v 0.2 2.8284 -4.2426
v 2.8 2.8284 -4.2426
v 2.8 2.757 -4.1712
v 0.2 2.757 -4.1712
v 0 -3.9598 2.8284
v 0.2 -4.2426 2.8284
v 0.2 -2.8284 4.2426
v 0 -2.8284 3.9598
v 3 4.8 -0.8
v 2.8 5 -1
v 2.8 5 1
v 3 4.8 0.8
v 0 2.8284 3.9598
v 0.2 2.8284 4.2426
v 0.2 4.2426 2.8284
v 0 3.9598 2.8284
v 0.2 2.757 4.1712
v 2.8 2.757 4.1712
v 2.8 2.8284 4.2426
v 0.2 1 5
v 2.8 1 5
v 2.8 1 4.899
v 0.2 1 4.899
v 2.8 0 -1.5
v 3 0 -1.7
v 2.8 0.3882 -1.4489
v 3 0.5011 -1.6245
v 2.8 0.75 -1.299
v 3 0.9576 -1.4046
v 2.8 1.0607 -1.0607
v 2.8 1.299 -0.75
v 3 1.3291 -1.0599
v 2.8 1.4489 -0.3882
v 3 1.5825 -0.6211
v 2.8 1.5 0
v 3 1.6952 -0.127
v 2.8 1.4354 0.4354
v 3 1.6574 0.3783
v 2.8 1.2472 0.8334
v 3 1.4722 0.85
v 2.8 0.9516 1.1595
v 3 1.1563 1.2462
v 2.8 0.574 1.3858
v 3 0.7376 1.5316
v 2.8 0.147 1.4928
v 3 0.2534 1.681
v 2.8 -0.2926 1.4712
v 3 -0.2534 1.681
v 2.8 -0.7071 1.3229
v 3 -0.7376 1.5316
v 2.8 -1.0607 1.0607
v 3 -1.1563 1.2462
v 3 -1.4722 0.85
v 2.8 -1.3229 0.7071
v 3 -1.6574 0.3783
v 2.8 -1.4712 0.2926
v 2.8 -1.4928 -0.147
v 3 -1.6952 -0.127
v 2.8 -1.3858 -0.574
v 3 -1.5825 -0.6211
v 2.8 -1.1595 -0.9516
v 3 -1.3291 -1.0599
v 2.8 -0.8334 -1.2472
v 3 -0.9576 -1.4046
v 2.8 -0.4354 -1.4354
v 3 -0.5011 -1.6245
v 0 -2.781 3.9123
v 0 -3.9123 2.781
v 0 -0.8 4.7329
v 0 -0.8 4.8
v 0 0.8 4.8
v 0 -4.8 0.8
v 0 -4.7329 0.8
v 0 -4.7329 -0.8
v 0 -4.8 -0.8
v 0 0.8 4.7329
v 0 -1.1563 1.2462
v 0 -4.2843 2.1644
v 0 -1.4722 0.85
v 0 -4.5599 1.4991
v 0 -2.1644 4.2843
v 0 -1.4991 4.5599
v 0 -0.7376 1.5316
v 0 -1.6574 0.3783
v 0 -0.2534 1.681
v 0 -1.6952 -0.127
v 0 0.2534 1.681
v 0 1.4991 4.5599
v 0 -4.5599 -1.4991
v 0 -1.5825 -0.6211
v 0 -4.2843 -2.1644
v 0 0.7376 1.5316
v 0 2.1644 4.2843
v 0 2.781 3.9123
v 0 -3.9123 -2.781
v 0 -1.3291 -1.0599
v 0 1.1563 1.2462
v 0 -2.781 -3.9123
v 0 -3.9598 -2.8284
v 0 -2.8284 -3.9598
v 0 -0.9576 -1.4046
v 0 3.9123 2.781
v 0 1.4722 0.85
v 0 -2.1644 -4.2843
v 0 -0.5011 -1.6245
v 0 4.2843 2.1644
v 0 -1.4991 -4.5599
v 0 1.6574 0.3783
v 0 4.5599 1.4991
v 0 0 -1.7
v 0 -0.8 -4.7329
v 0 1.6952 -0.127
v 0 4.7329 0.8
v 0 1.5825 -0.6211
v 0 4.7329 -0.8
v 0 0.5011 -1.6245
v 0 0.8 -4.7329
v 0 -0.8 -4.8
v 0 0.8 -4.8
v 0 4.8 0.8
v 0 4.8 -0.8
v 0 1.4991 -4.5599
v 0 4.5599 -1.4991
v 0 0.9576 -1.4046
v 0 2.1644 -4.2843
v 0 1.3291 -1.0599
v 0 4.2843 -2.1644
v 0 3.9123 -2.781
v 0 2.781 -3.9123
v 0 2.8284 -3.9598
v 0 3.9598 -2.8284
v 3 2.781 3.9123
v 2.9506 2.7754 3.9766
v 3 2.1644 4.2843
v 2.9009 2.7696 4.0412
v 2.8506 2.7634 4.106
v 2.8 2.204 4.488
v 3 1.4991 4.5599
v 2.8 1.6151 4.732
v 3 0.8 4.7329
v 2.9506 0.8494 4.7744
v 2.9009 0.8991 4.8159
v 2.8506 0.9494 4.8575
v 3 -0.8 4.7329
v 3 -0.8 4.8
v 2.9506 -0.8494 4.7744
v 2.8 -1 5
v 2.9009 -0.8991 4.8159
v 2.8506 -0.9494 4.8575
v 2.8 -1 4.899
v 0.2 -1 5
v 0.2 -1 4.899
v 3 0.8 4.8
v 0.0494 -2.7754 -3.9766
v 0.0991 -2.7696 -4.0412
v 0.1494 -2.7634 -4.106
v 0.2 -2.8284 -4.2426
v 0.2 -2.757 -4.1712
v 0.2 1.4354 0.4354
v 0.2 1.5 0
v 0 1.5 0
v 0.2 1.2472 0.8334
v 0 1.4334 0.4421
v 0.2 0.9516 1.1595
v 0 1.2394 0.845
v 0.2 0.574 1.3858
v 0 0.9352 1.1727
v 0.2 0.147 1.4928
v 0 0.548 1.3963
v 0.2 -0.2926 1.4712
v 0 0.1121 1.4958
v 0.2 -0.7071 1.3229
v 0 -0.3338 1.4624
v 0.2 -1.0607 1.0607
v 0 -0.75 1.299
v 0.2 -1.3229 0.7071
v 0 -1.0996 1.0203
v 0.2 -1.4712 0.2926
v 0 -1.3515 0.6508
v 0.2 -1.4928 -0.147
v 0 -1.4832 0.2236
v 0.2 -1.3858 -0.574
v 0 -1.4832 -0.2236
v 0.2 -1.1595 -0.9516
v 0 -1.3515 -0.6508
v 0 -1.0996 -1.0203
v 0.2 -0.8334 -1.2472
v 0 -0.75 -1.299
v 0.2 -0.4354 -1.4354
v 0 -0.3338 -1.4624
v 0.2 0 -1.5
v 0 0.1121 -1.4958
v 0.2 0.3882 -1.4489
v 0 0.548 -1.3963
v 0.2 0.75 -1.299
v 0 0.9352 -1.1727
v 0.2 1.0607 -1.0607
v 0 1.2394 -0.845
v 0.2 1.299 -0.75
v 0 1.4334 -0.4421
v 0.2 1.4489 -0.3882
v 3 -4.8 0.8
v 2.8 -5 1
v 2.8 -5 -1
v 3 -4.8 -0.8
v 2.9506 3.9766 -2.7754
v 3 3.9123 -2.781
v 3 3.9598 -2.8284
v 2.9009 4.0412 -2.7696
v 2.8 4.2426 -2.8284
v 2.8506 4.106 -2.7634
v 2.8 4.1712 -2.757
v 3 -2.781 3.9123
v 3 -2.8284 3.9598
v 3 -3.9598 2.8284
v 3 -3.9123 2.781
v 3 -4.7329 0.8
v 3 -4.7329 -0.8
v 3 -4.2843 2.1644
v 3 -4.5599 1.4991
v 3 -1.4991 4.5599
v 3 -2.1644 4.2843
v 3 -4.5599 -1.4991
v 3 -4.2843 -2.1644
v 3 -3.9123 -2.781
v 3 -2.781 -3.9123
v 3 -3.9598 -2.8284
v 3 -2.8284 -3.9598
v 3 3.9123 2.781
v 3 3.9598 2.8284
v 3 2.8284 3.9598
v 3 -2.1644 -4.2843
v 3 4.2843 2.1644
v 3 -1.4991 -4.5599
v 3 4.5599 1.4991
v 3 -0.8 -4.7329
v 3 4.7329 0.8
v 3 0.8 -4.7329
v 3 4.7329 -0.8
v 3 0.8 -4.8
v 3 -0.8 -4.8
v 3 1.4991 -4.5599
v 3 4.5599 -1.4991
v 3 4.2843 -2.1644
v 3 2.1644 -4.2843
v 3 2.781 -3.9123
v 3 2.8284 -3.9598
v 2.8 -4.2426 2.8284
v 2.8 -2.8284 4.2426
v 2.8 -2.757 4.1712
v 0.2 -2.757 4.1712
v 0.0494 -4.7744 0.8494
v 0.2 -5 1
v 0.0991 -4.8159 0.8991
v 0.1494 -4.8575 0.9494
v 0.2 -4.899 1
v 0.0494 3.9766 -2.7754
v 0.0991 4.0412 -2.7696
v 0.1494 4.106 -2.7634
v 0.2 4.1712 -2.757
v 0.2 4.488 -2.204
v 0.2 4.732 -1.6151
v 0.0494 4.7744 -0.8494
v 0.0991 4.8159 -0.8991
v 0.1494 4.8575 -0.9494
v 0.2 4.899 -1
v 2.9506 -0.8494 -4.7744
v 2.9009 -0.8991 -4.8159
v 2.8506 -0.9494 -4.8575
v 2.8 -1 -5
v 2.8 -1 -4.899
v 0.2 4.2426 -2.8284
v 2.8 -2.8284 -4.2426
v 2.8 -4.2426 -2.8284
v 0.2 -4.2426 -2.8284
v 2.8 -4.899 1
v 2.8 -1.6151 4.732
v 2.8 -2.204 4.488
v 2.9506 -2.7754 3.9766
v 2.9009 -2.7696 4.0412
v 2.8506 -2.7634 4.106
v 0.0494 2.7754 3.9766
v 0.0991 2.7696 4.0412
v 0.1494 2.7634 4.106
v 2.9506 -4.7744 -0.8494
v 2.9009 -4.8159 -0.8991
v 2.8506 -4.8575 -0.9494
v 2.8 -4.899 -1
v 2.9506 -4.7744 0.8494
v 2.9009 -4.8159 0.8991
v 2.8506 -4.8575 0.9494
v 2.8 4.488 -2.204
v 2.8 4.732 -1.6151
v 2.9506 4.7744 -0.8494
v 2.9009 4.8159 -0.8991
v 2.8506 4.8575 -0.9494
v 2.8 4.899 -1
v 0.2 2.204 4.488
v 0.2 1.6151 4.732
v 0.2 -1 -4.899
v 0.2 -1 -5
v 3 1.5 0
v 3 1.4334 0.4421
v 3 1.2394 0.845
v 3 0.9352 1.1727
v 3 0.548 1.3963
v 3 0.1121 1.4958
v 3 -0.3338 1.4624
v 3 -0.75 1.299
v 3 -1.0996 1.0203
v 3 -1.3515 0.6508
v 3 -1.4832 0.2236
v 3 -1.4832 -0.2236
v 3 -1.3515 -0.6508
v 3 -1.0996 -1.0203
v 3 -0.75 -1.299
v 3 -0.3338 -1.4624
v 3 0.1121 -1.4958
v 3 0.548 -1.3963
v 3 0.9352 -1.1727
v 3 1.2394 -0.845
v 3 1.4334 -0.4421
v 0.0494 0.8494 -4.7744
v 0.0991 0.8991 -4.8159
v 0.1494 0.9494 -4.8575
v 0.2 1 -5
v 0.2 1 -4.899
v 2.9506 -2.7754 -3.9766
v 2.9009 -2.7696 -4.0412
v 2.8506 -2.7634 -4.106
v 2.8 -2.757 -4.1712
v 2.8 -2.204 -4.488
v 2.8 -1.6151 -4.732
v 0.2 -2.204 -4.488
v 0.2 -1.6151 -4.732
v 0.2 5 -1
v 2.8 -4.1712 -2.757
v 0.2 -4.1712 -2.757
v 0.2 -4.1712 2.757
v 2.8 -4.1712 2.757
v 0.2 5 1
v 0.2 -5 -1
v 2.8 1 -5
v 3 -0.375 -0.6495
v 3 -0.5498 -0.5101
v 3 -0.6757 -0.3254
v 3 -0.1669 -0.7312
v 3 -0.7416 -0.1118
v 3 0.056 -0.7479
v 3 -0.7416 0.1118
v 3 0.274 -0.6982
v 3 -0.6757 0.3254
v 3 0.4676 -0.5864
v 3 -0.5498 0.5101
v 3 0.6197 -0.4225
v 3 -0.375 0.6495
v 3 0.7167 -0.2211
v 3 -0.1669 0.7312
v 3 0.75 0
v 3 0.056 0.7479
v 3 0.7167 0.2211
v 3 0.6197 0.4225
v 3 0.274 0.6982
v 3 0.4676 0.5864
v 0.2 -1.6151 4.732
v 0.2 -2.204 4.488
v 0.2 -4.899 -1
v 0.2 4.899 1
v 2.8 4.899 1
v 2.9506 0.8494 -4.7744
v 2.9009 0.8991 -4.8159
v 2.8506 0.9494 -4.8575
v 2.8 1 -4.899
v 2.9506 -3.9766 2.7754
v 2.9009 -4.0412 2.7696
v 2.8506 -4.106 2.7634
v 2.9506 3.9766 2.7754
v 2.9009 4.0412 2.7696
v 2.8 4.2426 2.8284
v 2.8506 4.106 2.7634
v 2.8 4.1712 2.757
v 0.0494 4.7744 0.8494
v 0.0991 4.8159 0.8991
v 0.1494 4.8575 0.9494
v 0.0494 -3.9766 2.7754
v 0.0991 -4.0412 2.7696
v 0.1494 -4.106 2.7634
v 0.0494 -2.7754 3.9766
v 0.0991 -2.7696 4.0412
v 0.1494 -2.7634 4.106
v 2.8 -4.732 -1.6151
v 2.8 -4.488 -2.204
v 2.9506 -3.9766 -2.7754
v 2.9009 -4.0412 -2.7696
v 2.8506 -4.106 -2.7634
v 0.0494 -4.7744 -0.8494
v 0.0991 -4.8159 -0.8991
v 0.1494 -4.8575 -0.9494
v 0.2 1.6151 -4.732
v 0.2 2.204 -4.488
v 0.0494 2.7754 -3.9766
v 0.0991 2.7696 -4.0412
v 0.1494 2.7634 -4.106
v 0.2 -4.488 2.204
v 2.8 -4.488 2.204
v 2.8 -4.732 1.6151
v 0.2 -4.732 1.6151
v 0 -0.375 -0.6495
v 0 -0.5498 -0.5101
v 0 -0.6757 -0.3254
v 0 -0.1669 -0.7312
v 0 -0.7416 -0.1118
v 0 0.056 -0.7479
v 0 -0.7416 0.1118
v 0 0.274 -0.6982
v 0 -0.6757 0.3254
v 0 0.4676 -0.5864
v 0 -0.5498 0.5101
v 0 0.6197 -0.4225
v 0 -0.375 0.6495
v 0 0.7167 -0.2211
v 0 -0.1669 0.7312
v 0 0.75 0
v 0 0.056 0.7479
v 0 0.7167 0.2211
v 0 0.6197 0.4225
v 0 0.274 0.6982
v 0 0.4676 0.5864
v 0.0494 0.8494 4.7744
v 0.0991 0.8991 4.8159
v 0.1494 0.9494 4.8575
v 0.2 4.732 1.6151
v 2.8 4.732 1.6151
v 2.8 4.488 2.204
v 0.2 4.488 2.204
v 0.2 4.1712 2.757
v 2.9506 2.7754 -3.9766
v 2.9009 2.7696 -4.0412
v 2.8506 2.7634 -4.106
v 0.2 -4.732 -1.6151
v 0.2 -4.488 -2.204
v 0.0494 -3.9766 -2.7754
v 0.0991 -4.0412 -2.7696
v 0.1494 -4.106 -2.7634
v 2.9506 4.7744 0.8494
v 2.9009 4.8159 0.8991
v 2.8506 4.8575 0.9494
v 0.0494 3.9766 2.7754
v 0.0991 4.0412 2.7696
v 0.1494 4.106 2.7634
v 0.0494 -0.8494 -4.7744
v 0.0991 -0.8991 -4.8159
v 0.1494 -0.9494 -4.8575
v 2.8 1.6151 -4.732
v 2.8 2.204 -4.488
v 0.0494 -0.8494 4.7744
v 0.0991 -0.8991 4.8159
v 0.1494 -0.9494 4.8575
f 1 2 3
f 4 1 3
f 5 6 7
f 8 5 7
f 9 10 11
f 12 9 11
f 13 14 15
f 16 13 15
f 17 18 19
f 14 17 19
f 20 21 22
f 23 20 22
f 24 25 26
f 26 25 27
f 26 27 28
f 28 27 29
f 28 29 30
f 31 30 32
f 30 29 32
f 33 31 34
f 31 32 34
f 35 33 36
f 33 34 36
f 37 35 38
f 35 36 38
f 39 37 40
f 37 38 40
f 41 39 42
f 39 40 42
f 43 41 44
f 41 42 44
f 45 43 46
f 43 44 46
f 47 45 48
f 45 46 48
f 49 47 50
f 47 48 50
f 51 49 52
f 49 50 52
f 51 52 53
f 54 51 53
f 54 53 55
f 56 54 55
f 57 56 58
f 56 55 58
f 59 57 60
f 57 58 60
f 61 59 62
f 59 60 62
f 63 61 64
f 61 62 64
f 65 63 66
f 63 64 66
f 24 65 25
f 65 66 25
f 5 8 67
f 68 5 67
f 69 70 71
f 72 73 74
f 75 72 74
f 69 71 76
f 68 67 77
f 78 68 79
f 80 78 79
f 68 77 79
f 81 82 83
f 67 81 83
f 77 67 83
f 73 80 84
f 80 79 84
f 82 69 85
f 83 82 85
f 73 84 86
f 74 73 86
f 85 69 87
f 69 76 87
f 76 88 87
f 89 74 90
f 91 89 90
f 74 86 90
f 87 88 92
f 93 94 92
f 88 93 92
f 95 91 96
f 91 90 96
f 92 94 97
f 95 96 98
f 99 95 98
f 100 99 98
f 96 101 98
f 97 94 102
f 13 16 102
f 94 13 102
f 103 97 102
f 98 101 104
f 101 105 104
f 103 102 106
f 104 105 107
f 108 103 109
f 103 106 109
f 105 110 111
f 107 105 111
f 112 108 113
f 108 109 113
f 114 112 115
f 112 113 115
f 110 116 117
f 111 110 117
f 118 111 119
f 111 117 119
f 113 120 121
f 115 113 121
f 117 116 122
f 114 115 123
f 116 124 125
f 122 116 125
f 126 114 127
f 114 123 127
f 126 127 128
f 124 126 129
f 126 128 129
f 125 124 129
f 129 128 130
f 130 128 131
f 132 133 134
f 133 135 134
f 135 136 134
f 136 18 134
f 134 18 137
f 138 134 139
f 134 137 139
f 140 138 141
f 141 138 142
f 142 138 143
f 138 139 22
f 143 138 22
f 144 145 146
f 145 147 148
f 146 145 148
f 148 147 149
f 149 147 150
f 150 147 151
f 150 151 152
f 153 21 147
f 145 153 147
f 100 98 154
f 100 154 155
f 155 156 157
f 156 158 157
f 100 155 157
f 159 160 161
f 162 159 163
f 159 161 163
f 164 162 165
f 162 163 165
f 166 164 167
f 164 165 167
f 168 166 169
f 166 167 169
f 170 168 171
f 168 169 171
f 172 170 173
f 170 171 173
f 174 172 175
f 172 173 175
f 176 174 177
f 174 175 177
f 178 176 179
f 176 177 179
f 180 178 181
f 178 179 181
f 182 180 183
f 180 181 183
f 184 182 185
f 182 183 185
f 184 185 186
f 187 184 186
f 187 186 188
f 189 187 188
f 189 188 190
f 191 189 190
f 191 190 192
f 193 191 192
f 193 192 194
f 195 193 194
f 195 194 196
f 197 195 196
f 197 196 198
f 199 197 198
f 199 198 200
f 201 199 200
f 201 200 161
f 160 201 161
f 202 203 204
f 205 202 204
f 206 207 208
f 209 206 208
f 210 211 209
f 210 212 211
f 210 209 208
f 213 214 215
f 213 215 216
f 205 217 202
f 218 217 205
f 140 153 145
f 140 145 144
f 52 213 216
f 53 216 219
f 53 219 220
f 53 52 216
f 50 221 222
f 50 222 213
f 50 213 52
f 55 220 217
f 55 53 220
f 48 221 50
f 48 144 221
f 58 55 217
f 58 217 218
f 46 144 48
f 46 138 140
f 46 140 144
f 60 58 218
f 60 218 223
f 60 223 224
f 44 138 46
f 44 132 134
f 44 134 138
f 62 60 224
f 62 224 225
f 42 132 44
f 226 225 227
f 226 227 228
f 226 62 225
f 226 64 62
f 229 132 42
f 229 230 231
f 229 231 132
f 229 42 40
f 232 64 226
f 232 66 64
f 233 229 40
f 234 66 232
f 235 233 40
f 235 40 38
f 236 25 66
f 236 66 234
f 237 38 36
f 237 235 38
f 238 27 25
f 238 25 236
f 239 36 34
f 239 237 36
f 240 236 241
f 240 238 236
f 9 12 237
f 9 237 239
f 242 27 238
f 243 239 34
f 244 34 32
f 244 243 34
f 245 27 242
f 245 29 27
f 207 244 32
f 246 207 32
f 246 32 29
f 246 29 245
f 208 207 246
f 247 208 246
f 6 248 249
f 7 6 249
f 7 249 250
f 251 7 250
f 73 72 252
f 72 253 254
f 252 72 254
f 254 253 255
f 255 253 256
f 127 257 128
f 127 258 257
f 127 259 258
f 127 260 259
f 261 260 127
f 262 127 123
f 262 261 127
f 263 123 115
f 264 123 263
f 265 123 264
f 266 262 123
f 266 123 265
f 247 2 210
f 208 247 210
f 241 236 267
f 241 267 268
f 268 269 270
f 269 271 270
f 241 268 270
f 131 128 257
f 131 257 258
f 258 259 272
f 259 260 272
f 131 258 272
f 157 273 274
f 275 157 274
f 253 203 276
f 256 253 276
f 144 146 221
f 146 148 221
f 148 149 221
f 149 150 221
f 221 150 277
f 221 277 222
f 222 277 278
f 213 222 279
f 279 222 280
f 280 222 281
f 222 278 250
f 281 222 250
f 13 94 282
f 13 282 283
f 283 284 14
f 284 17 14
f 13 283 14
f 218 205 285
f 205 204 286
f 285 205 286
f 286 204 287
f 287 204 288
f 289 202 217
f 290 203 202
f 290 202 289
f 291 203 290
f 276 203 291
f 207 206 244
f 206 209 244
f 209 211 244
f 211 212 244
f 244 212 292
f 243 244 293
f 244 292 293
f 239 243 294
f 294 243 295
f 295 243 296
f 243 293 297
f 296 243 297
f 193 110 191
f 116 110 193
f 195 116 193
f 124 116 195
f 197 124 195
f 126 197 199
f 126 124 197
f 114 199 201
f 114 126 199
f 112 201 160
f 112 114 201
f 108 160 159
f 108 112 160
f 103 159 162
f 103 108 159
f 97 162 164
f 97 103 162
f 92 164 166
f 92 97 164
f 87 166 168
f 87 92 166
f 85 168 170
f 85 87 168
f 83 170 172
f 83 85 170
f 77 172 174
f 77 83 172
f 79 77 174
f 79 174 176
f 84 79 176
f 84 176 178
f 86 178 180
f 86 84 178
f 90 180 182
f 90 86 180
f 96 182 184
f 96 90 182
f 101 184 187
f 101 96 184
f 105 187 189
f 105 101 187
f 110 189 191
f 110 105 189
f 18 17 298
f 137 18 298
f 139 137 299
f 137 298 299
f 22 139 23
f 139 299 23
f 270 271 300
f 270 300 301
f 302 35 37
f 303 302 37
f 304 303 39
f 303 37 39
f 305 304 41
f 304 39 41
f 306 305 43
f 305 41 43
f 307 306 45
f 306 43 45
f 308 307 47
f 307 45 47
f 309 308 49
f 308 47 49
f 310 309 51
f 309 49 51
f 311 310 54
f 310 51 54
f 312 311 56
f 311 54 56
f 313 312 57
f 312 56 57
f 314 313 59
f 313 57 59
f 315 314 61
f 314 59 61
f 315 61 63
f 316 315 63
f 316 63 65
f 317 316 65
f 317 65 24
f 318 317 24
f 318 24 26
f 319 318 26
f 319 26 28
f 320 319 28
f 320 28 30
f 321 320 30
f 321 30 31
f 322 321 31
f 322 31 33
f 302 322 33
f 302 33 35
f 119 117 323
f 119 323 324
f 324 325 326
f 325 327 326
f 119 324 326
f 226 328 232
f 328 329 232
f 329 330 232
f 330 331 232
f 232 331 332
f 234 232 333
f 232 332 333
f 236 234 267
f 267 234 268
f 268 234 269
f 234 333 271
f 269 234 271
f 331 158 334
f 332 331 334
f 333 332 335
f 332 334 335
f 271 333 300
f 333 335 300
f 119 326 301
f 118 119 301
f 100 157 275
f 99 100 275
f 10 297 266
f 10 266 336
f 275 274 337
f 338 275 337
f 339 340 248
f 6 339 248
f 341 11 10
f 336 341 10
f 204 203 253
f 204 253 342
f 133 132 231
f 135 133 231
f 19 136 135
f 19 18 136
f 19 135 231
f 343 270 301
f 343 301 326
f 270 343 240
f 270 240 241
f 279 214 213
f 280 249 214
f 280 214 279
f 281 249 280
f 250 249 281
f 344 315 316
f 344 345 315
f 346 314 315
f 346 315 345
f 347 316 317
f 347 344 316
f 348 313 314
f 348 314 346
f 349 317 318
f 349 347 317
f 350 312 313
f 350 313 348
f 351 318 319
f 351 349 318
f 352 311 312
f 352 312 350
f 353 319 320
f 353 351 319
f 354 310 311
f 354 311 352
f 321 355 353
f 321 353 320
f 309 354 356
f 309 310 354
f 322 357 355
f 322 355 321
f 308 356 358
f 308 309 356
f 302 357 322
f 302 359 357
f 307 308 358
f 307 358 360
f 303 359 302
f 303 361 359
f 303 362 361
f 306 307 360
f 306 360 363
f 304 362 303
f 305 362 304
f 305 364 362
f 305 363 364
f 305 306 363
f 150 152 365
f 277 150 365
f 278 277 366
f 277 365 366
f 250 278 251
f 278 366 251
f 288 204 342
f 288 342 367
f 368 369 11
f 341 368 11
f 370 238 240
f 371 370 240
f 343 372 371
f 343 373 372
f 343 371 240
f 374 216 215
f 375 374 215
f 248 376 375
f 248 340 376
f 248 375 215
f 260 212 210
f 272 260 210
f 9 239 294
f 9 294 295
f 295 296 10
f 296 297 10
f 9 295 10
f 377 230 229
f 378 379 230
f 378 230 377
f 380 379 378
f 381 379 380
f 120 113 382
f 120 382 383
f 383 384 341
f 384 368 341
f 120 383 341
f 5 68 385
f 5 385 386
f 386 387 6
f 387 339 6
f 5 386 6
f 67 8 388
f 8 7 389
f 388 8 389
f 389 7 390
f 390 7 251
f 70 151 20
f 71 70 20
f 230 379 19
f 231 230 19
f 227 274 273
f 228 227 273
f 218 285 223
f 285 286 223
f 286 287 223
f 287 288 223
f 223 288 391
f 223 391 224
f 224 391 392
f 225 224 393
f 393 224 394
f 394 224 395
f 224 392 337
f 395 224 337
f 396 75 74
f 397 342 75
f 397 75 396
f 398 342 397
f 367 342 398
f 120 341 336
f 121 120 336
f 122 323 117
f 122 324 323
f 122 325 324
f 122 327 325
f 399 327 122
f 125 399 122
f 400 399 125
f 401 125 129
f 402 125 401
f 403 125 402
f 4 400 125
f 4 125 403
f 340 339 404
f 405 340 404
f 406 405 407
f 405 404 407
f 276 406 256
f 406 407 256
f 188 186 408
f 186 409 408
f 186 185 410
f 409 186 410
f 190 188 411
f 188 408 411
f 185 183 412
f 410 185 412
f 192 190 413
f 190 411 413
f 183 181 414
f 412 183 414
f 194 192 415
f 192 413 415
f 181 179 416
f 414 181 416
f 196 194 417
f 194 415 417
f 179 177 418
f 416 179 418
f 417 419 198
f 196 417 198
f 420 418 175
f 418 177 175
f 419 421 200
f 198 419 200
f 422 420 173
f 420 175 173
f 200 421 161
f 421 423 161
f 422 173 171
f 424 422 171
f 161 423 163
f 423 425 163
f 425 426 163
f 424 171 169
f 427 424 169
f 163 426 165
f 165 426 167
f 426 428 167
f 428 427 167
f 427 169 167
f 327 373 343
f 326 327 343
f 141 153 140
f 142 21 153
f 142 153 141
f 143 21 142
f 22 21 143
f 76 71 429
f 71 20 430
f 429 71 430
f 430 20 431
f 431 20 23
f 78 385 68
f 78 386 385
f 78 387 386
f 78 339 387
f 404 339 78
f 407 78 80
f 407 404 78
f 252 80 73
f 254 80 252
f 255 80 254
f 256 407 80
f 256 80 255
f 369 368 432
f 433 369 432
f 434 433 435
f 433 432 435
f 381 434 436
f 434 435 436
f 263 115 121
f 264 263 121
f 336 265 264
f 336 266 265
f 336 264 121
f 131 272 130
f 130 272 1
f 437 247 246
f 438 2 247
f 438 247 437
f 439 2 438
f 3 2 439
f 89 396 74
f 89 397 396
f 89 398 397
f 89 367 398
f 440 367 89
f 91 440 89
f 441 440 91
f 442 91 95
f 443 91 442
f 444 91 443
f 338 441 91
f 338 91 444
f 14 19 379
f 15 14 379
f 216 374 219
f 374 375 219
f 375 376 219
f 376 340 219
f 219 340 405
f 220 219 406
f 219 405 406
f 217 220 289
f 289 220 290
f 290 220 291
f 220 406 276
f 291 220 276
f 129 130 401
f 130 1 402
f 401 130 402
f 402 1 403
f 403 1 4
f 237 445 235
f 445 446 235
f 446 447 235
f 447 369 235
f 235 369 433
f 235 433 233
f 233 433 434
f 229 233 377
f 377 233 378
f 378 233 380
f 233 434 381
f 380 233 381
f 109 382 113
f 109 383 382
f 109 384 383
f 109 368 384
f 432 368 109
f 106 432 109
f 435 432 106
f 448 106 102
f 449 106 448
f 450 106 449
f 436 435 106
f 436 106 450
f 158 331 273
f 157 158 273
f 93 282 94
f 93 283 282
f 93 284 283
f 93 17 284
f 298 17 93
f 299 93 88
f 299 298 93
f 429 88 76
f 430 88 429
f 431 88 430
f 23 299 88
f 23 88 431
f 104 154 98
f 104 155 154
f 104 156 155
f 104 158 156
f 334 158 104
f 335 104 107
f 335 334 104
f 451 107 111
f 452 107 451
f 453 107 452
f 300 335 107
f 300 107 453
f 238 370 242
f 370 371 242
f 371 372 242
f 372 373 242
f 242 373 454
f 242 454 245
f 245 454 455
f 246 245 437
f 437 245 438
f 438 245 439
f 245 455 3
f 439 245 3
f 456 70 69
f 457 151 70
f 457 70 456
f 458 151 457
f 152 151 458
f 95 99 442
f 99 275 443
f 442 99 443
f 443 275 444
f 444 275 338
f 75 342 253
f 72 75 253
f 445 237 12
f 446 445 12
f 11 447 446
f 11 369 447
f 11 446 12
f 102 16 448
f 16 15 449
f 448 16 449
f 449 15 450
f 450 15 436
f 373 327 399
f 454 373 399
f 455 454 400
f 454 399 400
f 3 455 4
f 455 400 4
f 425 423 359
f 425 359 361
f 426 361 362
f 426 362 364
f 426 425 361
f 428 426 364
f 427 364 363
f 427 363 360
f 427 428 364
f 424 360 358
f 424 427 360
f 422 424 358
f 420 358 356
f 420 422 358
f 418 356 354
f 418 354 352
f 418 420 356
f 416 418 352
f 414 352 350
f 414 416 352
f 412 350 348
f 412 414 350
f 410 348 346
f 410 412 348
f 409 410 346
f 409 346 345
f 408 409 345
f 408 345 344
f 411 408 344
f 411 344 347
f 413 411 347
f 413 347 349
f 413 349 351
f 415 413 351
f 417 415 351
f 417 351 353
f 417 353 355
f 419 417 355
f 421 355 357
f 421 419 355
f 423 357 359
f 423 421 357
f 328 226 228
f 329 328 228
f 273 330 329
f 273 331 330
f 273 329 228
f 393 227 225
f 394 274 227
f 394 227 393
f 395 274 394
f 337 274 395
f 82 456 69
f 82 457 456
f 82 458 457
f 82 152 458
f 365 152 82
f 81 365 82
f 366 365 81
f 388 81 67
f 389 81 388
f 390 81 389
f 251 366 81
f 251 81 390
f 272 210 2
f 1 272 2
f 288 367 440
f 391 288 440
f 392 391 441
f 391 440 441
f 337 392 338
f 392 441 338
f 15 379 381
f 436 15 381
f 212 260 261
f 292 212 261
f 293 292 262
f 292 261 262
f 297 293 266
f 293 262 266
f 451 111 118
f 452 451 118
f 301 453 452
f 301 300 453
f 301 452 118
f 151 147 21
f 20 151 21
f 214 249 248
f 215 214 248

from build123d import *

# Parameters (mm, degrees)
SKETCH1_R                 = 5
SKETCH1_R_2               = 1.5
BOSS_EXTRUDE1_DEPTH       = 3
SKETCH2_W                 = 0.580440463
SKETCH2_H                 = 2
SKETCH2_W_2               = 2
SKETCH2_H_2               = 0.580440463
BOSS_EXTRUDE2_DEPTH       = 3
CHAMFER3_SIZE             = 0.2
CHAMFER4_SIZE             = 0.2
BOSS_EXTRUDE3_OUTLINE_R   = 1.5
BOSS_EXTRUDE3_OUTLINE_R_2 = 0.75
BOSS_EXTRUDE3_DEPTH       = 3


# Read off the part's stored shape, not the designer's step: Boss-Extrude3
with BuildPart() as part:
    # Sketch1 → Boss-Extrude1 (new body)
    with BuildSketch(Plane(origin=(0, 0, 0), x_dir=(0, 0, -1), z_dir=(1, 0, 0))):
        Circle(SKETCH1_R)
        Circle(SKETCH1_R_2, mode=Mode.SUBTRACT)
    extrude(amount=BOSS_EXTRUDE1_DEPTH)

    # Sketch2 → Boss-Extrude2 (add)
    with BuildSketch(Plane(origin=(3, 0, 0), x_dir=(0, 0, -1), z_dir=(1, 0, 0))):
        with Locations((4.709779769, 0)):
            Rectangle(SKETCH2_W, SKETCH2_H)
        Polygon((4.242640687, -2.828427125), (2.828427125, -4.242640687), (2.417993737, -3.8322073), (3.8322073, -2.417993737), align=None)
        with Locations((0, -4.709779769)):
            Rectangle(SKETCH2_W_2, SKETCH2_H_2)
        Polygon((-2.828427125, -4.242640687), (-4.242640687, -2.828427125), (-3.8322073, -2.417993737), (-2.417993737, -3.8322073), align=None)
        with Locations((-4.709779769, 0)):
            Rectangle(SKETCH2_W, SKETCH2_H)
        Polygon((-4.242640687, 2.828427125), (-2.828427125, 4.242640687), (-2.417993737, 3.8322073), (-3.8322073, 2.417993737), align=None)
        with Locations((0, 4.709779769)):
            Rectangle(SKETCH2_W_2, SKETCH2_H_2)
        Polygon((2.828427125, 4.242640687), (4.242640687, 2.828427125), (3.8322073, 2.417993737), (2.417993737, 3.8322073), align=None)
    extrude(amount=-BOSS_EXTRUDE2_DEPTH)

    # Chamfer3
    chamfer3_edges = [part.edges().sort_by_distance(p)[0] for p in [
        (3, 0, 5),
        (3, 1, 4.949489743),
        (3, -1, 4.949489743),
        (3, 1.913417162, 4.619397663),
        (3, 2.792710979, 4.206924542),
        (3, 3.535533906, 3.535533906),
        (3, 4.206924542, 2.792710979),
        (3, 4.619397663, 1.913417162),
        (3, 4.949489743, 1),
        (3, 5, 0),
        (3, 4.949489743, -1),
        (3, 4.619397663, -1.913417162),
        (3, 1, -4.949489743),
        (3, 0, -5),
        (3, 4.206924542, -2.792710979),
        (3, 3.535533906, -3.535533906),
        (3, 2.792710979, -4.206924542),
        (3, -1, -4.949489743),
        (3, -1.913417162, -4.619397663),
        (3, -2.792710979, -4.206924542),
        (3, -3.535533906, -3.535533906),
        (3, -4.206924542, -2.792710979),
        (3, 0, 1.5),
        (3, -4.619397663, -1.913417162),
        (3, -4.949489743, -1),
        (3, -5, 0),
        (3, -4.949489743, 1),
        (3, -4.619397663, 1.913417162),
        (3, -4.206924542, 2.792710979),
        (3, -3.535533906, 3.535533906),
        (3, -2.792710979, 4.206924542),
        (3, 1.913417162, -4.619397663),
        (3, -1.913417162, 4.619397663),
    ]]
    chamfer(chamfer3_edges, length=CHAMFER3_SIZE)

    # Chamfer4
    chamfer4_edges = [part.edges().sort_by_distance(p)[0] for p in [
        (0, -1, 4.949489743),
        (0, 0, 5),
        (0, 1, 4.949489743),
        (0, 1.913417162, -4.619397663),
        (0, 1.913417162, 4.619397663),
        (0, 2.792710979, 4.206924542),
        (0, 3.535533906, 3.535533906),
        (0, 4.206924542, 2.792710979),
        (0, 4.619397663, 1.913417162),
        (0, 1, -4.949489743),
        (0, 4.949489743, 1),
        (0, 5, 0),
        (0, 4.949489743, -1),
        (0, 0, -5),
        (0, -1, -4.949489743),
        (0, 4.619397663, -1.913417162),
        (0, 4.206924542, -2.792710979),
        (0, 3.535533906, -3.535533906),
        (0, 2.792710979, -4.206924542),
        (0, -1.913417162, -4.619397663),
        (0, -2.792710979, -4.206924542),
        (0, -3.535533906, -3.535533906),
        (0, -4.206924542, -2.792710979),
        (0, 0, 1.5),
        (0, -4.619397663, -1.913417162),
        (0, -4.949489743, -1),
        (0, -5, 0),
        (0, -4.949489743, 1),
        (0, -4.619397663, 1.913417162),
        (0, -4.206924542, 2.792710979),
        (0, -3.535533906, 3.535533906),
        (0, -2.792710979, 4.206924542),
        (0, -1.913417162, 4.619397663),
    ]]
    chamfer(chamfer4_edges, length=CHAMFER4_SIZE)

    # Boss-Extrude3 outline → Boss-Extrude3 (add)
    with BuildSketch(Plane.YZ):
        Circle(BOSS_EXTRUDE3_OUTLINE_R)
        Circle(BOSS_EXTRUDE3_OUTLINE_R_2, mode=Mode.SUBTRACT)
    extrude(amount=BOSS_EXTRUDE3_DEPTH)


solid = part.part
